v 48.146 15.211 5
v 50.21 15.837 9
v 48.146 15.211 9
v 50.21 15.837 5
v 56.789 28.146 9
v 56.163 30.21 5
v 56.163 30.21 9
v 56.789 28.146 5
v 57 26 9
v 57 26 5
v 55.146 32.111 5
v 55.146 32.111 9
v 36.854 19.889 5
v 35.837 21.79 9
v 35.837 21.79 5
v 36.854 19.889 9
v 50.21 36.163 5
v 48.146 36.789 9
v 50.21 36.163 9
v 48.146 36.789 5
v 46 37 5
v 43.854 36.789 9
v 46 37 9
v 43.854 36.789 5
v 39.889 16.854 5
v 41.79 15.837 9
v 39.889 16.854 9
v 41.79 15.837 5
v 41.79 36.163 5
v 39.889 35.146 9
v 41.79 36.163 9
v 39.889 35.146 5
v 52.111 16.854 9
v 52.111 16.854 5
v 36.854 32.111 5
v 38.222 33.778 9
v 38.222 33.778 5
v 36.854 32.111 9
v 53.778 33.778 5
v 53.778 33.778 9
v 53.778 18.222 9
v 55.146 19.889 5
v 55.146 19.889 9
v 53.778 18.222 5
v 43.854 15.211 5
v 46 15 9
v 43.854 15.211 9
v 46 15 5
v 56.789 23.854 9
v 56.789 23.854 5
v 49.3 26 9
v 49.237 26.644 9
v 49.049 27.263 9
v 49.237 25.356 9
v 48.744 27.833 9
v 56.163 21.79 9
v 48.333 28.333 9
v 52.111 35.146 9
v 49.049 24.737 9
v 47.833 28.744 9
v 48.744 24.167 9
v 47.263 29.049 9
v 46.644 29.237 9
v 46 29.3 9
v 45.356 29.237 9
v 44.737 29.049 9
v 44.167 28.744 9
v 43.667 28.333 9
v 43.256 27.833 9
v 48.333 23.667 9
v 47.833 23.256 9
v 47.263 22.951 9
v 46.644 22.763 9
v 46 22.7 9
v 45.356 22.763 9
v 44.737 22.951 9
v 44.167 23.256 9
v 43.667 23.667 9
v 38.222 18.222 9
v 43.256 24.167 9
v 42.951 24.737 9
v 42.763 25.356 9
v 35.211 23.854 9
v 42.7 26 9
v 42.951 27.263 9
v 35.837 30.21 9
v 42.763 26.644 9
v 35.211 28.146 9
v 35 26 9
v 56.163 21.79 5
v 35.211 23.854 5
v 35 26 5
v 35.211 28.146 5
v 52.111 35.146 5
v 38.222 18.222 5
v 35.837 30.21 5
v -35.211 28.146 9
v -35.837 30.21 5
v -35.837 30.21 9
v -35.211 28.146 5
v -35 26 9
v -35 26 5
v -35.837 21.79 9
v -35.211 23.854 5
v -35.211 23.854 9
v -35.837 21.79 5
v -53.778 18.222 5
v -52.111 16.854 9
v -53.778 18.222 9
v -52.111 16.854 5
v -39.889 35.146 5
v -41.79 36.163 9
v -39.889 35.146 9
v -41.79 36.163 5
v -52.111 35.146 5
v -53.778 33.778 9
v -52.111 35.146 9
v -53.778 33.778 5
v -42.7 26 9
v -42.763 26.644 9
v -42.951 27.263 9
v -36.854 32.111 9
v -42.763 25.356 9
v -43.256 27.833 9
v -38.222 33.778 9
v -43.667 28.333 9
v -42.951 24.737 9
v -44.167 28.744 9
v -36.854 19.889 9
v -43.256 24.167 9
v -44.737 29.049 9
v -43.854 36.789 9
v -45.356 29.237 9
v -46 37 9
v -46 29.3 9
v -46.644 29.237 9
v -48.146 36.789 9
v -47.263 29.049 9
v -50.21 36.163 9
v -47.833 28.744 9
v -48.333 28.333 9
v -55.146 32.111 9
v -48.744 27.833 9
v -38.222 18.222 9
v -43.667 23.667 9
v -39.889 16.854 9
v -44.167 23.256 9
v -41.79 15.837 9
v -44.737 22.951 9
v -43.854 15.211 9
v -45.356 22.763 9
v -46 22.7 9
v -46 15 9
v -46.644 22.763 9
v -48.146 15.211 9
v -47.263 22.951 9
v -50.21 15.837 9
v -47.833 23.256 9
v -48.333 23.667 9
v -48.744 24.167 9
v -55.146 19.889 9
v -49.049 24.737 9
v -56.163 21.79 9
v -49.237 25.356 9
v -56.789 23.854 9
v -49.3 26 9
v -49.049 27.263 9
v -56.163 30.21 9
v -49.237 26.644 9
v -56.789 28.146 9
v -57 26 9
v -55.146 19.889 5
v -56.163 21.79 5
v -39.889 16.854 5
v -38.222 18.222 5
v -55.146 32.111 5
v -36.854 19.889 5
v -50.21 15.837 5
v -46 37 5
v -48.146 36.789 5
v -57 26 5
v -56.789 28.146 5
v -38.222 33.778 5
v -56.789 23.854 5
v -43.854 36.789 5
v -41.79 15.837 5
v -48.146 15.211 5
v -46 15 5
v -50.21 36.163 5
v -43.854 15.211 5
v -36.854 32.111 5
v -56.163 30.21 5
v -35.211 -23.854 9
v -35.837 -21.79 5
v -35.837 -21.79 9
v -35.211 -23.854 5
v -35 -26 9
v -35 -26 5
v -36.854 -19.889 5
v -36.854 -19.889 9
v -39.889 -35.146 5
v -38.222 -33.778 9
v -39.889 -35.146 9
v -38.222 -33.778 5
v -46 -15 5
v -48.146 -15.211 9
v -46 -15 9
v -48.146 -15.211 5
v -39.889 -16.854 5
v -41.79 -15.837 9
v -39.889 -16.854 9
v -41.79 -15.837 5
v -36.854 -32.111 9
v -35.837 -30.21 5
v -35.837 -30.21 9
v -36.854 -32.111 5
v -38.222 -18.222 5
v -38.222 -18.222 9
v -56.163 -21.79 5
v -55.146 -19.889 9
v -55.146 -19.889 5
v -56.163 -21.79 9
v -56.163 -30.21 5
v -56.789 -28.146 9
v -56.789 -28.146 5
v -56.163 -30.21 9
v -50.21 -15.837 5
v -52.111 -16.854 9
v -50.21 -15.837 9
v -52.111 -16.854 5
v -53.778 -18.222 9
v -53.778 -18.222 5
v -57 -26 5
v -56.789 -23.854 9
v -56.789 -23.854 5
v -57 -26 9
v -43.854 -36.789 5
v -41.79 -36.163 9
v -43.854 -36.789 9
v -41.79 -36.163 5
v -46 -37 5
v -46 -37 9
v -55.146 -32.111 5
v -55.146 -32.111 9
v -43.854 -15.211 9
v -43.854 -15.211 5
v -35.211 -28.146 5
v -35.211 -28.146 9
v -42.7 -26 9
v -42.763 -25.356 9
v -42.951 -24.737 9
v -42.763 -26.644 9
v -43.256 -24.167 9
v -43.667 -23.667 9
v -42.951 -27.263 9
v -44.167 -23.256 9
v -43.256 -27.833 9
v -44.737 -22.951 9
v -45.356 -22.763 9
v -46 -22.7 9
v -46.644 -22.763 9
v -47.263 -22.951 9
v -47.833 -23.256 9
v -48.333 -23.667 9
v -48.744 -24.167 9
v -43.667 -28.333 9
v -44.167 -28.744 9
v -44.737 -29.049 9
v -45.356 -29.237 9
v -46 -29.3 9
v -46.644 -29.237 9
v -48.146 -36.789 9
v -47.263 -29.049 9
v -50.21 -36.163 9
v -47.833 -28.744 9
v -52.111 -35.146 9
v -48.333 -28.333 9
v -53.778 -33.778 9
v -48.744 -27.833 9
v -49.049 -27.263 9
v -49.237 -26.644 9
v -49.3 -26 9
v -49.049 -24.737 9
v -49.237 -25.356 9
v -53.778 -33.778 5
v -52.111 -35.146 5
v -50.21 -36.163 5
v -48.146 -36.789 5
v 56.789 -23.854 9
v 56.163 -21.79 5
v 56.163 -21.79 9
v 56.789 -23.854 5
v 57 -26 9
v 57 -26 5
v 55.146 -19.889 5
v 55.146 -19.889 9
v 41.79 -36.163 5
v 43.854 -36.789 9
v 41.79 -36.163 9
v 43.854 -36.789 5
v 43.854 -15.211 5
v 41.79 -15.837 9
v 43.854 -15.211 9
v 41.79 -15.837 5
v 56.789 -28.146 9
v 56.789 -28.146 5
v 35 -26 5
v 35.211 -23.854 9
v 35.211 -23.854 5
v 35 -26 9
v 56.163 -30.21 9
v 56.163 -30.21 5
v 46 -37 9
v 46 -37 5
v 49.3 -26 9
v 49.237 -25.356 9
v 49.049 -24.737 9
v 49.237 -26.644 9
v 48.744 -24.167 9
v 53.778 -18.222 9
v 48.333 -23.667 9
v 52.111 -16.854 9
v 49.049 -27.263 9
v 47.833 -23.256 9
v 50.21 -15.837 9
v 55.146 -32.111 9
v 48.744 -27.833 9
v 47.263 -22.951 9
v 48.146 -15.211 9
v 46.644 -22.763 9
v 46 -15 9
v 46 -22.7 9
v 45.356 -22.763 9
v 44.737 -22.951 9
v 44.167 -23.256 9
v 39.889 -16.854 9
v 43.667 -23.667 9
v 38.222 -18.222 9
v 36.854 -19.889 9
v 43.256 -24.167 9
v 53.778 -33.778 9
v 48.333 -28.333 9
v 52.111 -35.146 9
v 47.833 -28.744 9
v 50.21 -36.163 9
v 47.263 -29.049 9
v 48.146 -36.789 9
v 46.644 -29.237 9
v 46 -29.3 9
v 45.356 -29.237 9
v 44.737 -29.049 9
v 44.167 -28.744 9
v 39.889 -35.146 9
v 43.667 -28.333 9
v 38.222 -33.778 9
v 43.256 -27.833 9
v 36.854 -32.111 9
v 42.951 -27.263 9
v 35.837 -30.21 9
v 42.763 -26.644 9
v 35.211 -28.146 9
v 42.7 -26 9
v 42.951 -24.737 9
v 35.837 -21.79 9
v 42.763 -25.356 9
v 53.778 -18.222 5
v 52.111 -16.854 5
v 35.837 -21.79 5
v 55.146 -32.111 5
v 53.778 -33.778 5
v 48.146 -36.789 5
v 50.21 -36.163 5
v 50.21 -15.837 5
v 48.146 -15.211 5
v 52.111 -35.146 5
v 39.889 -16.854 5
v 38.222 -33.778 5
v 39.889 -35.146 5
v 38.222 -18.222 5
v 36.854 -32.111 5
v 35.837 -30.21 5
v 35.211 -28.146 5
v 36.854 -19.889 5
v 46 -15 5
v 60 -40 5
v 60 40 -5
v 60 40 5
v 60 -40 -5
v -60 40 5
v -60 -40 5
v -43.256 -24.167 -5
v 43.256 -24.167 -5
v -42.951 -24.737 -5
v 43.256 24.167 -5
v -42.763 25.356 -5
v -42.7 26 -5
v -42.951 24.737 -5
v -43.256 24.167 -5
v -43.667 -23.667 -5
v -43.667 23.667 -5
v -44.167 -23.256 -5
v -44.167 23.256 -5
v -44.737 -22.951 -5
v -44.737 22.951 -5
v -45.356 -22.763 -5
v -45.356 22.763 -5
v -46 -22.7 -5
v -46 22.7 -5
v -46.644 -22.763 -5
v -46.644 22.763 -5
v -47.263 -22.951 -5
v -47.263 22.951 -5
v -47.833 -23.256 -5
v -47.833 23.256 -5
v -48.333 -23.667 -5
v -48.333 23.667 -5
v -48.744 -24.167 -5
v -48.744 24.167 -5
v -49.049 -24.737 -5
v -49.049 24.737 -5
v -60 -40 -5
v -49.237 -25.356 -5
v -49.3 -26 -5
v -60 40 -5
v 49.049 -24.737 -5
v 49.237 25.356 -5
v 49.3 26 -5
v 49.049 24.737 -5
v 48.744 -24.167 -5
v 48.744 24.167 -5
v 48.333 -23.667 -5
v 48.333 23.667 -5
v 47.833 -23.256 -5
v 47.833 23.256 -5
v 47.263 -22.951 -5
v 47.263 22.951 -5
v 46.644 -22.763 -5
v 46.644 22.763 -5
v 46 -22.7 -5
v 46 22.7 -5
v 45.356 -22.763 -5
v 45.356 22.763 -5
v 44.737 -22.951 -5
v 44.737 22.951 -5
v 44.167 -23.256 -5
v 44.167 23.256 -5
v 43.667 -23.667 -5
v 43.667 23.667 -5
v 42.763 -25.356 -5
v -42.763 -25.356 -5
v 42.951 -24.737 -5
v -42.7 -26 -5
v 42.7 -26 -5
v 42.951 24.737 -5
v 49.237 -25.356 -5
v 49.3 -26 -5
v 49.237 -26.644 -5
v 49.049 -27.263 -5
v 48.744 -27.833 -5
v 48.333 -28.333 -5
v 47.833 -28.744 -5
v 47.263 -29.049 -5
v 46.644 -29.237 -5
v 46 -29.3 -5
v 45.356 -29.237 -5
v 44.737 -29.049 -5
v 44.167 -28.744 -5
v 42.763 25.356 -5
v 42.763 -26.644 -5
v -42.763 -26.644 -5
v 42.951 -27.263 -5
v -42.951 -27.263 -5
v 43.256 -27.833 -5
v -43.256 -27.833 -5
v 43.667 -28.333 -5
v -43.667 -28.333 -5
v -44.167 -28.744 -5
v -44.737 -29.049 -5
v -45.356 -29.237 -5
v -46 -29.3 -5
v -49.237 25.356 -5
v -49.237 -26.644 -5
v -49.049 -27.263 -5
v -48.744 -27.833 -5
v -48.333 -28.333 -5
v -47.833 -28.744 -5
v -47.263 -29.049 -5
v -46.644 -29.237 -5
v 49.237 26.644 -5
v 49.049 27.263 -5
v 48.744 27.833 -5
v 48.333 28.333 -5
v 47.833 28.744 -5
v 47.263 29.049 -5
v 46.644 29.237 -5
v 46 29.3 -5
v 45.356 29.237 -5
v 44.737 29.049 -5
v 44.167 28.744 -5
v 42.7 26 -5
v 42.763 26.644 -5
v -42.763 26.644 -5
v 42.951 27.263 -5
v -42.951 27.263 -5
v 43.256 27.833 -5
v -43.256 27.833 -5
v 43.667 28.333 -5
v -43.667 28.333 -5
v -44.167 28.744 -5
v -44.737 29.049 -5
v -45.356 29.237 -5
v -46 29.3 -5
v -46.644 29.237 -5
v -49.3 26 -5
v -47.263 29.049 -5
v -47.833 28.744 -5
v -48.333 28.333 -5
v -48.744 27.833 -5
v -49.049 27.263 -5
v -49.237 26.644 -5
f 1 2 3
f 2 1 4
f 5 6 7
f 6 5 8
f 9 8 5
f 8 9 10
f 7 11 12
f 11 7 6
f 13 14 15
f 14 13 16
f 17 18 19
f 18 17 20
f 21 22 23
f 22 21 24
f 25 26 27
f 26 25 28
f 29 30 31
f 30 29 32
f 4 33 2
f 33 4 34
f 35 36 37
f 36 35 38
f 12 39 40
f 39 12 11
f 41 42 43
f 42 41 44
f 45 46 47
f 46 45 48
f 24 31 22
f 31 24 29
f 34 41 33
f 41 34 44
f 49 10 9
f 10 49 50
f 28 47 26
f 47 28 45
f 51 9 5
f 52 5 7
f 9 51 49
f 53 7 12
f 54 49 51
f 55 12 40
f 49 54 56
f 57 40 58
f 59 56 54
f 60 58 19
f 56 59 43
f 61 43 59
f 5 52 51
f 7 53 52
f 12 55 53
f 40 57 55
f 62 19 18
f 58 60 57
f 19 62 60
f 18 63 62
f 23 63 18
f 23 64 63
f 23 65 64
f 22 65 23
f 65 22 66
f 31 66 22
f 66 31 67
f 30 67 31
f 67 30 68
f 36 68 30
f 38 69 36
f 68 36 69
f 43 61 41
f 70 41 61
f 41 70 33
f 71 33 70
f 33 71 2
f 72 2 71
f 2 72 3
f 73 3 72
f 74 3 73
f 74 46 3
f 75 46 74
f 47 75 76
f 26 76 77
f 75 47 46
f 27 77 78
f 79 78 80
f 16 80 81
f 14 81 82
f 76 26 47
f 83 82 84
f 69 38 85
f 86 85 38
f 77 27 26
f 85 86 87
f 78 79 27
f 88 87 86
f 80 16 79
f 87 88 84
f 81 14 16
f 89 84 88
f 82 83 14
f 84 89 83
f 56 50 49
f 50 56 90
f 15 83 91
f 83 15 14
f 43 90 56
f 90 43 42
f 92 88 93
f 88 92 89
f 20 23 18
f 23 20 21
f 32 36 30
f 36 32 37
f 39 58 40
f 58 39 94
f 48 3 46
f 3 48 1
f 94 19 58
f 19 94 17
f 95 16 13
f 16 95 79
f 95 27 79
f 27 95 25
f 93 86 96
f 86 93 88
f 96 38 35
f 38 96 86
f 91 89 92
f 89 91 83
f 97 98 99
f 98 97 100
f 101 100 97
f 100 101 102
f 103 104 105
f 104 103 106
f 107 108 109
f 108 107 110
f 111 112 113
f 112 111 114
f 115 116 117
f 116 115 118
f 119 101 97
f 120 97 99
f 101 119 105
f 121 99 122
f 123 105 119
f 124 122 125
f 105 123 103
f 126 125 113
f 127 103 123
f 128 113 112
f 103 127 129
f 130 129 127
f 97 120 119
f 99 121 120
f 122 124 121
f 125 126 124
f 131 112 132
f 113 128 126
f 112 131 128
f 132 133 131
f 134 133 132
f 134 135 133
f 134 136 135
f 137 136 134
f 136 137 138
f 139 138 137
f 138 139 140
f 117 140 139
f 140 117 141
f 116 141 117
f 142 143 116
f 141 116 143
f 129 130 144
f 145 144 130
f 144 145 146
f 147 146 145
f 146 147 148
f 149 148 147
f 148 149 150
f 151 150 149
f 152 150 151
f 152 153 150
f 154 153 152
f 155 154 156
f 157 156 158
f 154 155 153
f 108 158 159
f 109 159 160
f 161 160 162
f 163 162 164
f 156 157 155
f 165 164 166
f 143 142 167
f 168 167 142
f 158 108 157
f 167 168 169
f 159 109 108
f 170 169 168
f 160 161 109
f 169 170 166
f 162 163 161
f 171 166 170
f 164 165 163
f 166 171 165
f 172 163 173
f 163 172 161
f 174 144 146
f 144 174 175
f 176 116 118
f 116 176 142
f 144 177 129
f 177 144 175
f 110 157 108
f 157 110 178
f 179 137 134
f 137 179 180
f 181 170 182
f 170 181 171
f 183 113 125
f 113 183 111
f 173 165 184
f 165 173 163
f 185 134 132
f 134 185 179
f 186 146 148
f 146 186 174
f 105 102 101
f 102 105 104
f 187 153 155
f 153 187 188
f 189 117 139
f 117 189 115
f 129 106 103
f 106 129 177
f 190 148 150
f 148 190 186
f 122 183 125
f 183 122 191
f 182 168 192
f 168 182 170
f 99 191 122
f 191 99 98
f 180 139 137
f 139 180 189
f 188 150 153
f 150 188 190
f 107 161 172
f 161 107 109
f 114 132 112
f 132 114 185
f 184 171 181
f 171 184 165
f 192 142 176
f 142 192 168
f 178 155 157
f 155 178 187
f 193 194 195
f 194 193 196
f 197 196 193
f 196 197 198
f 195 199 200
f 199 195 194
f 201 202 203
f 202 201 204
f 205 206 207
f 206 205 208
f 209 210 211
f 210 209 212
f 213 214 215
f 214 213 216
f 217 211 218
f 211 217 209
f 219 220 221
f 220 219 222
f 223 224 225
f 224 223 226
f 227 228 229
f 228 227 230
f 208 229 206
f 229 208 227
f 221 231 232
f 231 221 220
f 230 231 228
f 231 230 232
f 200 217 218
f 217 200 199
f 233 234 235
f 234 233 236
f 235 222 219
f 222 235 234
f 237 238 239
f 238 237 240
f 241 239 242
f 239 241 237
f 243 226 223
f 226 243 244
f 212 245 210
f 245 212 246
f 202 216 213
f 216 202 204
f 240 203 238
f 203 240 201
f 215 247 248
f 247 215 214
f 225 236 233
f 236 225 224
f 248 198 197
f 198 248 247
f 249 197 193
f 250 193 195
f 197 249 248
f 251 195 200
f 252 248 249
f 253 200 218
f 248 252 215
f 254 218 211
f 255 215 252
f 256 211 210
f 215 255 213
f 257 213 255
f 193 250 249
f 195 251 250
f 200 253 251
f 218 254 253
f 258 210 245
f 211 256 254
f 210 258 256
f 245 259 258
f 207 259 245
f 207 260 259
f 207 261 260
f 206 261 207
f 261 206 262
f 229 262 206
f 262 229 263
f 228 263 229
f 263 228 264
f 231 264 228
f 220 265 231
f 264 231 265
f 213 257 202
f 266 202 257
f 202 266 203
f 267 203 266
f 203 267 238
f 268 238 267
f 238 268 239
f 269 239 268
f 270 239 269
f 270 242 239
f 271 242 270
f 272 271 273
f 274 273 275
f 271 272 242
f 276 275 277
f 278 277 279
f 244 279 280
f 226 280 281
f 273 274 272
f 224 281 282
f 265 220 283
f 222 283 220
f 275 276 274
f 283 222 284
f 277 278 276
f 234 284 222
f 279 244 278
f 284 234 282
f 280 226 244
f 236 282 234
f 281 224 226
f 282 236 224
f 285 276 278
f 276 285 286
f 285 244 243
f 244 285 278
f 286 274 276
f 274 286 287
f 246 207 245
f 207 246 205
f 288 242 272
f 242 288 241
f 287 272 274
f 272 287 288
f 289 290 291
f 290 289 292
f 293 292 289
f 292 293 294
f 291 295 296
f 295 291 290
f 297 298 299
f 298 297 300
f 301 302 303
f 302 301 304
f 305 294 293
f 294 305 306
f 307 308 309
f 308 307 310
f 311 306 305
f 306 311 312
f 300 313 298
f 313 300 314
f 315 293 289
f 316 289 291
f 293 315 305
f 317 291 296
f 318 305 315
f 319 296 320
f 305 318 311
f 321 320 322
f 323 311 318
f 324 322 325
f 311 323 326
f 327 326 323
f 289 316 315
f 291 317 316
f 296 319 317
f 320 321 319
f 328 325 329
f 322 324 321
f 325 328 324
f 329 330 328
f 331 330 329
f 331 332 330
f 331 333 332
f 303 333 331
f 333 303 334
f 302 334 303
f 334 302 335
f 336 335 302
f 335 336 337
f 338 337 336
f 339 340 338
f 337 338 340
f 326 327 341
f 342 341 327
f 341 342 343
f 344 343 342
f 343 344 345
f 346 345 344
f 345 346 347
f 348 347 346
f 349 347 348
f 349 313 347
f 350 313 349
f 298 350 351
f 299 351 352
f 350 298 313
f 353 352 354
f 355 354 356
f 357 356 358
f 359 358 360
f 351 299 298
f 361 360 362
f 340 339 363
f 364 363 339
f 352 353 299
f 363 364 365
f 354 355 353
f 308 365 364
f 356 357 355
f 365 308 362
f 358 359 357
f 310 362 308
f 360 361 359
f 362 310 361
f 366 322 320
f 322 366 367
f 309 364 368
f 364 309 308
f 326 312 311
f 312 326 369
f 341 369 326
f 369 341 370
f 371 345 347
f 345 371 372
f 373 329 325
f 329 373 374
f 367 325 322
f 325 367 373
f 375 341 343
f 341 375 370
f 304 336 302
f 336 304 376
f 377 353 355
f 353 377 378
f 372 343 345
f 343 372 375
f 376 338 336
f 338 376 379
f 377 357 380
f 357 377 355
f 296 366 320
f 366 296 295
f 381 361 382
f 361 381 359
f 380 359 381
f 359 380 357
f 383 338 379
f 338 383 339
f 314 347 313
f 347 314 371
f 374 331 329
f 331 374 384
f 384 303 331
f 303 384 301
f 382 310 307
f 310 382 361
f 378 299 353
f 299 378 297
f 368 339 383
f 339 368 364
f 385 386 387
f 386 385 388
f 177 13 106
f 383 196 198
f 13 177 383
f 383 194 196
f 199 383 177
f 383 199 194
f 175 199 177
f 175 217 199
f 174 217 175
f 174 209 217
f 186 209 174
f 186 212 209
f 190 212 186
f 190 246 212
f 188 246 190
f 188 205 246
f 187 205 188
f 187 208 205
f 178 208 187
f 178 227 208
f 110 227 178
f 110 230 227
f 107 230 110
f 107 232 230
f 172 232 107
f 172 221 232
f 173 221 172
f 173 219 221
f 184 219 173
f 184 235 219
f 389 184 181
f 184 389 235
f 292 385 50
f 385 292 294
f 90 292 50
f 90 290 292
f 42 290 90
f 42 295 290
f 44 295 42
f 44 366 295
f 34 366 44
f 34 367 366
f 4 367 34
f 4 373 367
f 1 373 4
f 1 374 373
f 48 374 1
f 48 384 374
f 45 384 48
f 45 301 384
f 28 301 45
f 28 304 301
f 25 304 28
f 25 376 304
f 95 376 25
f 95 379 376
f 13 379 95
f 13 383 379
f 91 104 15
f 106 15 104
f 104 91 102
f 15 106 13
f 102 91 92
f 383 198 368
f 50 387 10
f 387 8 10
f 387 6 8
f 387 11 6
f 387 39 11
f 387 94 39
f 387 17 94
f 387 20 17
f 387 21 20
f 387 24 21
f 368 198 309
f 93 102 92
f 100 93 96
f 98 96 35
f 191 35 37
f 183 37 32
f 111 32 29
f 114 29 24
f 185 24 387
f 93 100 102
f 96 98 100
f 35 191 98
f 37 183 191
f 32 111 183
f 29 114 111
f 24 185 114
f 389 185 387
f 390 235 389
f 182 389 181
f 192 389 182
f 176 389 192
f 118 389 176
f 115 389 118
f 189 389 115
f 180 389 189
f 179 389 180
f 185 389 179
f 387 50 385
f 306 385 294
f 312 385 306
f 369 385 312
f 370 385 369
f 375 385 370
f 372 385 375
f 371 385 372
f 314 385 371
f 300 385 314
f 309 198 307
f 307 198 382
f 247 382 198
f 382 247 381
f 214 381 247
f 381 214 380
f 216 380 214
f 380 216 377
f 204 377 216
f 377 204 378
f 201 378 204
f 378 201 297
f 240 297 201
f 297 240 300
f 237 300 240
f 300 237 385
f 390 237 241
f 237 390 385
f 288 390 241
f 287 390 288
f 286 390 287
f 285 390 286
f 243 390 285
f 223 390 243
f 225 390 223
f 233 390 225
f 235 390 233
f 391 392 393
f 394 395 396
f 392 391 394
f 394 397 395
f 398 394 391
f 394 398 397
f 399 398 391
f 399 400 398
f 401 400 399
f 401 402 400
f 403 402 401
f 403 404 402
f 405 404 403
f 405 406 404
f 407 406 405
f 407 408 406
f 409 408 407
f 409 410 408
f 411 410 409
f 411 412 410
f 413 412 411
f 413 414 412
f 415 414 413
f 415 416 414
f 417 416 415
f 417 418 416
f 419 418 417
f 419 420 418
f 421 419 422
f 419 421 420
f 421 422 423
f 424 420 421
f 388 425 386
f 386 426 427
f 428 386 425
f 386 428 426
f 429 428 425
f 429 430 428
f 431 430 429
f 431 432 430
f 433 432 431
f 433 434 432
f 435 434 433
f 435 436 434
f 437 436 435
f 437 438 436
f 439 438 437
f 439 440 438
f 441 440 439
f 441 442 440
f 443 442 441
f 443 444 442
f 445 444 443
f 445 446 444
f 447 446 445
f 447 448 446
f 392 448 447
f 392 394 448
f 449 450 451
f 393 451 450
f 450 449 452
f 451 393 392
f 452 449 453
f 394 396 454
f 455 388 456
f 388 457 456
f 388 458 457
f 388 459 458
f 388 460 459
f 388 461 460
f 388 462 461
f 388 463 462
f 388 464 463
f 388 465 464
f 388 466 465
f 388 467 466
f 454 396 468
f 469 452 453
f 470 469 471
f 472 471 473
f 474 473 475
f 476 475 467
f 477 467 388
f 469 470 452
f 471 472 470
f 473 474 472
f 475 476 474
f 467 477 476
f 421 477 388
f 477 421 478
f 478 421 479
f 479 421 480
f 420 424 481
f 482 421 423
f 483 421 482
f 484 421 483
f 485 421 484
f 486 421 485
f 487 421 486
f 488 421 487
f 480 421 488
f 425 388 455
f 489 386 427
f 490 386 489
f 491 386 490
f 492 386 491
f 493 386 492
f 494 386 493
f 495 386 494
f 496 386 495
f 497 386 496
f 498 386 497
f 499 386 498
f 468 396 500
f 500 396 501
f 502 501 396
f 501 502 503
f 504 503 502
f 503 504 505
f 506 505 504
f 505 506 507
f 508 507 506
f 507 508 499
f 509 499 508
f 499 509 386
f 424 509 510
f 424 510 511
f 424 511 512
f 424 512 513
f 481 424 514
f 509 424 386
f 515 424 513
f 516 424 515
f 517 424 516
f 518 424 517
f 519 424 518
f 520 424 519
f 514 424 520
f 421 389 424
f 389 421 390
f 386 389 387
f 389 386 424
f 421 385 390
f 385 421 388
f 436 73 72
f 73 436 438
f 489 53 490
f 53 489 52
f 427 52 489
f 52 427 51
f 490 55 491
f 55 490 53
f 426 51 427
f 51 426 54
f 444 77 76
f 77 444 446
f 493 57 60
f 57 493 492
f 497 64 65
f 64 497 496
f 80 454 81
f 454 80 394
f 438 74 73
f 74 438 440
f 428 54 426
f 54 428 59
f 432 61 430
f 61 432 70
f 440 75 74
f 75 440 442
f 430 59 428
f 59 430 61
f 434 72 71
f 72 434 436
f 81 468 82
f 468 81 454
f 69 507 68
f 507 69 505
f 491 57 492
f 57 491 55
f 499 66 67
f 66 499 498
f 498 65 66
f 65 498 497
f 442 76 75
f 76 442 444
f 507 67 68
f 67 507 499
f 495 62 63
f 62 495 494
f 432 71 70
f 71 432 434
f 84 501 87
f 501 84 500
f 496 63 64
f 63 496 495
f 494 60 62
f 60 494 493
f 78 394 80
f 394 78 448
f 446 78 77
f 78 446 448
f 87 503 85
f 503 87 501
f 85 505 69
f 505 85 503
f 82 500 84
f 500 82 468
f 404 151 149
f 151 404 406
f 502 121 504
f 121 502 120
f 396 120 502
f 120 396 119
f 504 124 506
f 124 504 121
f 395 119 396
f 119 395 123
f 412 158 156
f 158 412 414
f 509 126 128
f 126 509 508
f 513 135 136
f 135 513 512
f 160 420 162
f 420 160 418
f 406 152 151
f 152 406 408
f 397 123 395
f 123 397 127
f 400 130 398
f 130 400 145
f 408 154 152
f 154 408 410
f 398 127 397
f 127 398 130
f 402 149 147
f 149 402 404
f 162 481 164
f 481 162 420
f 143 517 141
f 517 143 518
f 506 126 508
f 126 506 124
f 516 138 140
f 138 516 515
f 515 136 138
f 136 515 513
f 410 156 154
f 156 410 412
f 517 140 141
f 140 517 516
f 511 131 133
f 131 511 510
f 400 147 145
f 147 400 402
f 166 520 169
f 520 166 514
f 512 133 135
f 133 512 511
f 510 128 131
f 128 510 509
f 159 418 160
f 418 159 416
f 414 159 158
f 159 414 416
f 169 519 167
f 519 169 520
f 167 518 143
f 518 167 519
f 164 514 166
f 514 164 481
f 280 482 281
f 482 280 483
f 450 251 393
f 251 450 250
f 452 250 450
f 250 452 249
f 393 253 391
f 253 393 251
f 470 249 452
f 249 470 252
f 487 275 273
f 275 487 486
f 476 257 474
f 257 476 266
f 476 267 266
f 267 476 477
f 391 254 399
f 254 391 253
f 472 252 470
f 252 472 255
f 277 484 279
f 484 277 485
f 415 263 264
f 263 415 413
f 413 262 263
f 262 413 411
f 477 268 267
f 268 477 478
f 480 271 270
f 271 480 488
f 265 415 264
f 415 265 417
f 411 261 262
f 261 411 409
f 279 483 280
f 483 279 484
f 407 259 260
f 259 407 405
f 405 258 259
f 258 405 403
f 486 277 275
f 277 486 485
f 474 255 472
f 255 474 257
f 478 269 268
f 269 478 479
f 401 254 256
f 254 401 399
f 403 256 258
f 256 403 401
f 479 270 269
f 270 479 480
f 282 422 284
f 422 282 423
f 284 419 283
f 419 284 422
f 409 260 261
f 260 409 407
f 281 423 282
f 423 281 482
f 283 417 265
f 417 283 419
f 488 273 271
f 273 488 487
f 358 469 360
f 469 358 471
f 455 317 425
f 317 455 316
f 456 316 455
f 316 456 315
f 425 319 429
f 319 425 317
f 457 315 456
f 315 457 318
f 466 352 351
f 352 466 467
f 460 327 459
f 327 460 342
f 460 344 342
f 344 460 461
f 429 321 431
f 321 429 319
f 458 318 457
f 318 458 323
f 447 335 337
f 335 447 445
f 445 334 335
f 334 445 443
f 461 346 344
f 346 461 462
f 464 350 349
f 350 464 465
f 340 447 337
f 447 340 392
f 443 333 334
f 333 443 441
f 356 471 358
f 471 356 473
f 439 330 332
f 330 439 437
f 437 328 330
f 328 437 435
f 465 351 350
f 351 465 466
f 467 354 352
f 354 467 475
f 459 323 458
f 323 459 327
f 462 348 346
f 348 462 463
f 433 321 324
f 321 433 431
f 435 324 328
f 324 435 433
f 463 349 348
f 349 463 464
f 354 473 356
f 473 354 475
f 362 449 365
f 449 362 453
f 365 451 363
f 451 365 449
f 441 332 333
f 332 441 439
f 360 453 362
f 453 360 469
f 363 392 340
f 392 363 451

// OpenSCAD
$fn = 32;

// ----------------------------------------------------------------------
// Anchor pads 120 x 80 x 14
// four corner bosses with anchor holes
// ----------------------------------------------------------------------

// --- parameters (mm) ---
plate = [120, 80, 10];  // base plate size (x, y, z)
pads = 4;               // boss count, one per corner
edge = 14;              // boss centre offset from the plate edge
boss_d = 22;            // boss diameter
boss_h = 4;             // boss height above the base plate
hole_d = 6.6;           // hole diameter

// --- derived feature positions (mm) ---
height = plate[2] + boss_h;      // = 14   overall height of the part
corner_x = plate[0] / 2 - edge;  // = 46   boss centre X
corner_y = plate[1] / 2 - edge;  // = 26   boss centre Y
feature_centers = [
  [corner_x, corner_y],
  [-corner_x, corner_y],
  [-corner_x, -corner_y],
  [corner_x, -corner_y]
];   // boss centres, anchor holes are drilled there

// base plate, four bosses standing on it, anchor holes all the way through
difference() {
  union() {
    cube(plate, center = true);
    for (centre = feature_centers)
      translate([centre[0], centre[1], plate[2] / 2 - 1])
        cylinder(d = boss_d, h = boss_h + 1);
  }
  for (centre = feature_centers)
    translate([centre[0], centre[1], -height])
      cylinder(d = hole_d, h = 2 * height + 2);  // through boss and plate
}
